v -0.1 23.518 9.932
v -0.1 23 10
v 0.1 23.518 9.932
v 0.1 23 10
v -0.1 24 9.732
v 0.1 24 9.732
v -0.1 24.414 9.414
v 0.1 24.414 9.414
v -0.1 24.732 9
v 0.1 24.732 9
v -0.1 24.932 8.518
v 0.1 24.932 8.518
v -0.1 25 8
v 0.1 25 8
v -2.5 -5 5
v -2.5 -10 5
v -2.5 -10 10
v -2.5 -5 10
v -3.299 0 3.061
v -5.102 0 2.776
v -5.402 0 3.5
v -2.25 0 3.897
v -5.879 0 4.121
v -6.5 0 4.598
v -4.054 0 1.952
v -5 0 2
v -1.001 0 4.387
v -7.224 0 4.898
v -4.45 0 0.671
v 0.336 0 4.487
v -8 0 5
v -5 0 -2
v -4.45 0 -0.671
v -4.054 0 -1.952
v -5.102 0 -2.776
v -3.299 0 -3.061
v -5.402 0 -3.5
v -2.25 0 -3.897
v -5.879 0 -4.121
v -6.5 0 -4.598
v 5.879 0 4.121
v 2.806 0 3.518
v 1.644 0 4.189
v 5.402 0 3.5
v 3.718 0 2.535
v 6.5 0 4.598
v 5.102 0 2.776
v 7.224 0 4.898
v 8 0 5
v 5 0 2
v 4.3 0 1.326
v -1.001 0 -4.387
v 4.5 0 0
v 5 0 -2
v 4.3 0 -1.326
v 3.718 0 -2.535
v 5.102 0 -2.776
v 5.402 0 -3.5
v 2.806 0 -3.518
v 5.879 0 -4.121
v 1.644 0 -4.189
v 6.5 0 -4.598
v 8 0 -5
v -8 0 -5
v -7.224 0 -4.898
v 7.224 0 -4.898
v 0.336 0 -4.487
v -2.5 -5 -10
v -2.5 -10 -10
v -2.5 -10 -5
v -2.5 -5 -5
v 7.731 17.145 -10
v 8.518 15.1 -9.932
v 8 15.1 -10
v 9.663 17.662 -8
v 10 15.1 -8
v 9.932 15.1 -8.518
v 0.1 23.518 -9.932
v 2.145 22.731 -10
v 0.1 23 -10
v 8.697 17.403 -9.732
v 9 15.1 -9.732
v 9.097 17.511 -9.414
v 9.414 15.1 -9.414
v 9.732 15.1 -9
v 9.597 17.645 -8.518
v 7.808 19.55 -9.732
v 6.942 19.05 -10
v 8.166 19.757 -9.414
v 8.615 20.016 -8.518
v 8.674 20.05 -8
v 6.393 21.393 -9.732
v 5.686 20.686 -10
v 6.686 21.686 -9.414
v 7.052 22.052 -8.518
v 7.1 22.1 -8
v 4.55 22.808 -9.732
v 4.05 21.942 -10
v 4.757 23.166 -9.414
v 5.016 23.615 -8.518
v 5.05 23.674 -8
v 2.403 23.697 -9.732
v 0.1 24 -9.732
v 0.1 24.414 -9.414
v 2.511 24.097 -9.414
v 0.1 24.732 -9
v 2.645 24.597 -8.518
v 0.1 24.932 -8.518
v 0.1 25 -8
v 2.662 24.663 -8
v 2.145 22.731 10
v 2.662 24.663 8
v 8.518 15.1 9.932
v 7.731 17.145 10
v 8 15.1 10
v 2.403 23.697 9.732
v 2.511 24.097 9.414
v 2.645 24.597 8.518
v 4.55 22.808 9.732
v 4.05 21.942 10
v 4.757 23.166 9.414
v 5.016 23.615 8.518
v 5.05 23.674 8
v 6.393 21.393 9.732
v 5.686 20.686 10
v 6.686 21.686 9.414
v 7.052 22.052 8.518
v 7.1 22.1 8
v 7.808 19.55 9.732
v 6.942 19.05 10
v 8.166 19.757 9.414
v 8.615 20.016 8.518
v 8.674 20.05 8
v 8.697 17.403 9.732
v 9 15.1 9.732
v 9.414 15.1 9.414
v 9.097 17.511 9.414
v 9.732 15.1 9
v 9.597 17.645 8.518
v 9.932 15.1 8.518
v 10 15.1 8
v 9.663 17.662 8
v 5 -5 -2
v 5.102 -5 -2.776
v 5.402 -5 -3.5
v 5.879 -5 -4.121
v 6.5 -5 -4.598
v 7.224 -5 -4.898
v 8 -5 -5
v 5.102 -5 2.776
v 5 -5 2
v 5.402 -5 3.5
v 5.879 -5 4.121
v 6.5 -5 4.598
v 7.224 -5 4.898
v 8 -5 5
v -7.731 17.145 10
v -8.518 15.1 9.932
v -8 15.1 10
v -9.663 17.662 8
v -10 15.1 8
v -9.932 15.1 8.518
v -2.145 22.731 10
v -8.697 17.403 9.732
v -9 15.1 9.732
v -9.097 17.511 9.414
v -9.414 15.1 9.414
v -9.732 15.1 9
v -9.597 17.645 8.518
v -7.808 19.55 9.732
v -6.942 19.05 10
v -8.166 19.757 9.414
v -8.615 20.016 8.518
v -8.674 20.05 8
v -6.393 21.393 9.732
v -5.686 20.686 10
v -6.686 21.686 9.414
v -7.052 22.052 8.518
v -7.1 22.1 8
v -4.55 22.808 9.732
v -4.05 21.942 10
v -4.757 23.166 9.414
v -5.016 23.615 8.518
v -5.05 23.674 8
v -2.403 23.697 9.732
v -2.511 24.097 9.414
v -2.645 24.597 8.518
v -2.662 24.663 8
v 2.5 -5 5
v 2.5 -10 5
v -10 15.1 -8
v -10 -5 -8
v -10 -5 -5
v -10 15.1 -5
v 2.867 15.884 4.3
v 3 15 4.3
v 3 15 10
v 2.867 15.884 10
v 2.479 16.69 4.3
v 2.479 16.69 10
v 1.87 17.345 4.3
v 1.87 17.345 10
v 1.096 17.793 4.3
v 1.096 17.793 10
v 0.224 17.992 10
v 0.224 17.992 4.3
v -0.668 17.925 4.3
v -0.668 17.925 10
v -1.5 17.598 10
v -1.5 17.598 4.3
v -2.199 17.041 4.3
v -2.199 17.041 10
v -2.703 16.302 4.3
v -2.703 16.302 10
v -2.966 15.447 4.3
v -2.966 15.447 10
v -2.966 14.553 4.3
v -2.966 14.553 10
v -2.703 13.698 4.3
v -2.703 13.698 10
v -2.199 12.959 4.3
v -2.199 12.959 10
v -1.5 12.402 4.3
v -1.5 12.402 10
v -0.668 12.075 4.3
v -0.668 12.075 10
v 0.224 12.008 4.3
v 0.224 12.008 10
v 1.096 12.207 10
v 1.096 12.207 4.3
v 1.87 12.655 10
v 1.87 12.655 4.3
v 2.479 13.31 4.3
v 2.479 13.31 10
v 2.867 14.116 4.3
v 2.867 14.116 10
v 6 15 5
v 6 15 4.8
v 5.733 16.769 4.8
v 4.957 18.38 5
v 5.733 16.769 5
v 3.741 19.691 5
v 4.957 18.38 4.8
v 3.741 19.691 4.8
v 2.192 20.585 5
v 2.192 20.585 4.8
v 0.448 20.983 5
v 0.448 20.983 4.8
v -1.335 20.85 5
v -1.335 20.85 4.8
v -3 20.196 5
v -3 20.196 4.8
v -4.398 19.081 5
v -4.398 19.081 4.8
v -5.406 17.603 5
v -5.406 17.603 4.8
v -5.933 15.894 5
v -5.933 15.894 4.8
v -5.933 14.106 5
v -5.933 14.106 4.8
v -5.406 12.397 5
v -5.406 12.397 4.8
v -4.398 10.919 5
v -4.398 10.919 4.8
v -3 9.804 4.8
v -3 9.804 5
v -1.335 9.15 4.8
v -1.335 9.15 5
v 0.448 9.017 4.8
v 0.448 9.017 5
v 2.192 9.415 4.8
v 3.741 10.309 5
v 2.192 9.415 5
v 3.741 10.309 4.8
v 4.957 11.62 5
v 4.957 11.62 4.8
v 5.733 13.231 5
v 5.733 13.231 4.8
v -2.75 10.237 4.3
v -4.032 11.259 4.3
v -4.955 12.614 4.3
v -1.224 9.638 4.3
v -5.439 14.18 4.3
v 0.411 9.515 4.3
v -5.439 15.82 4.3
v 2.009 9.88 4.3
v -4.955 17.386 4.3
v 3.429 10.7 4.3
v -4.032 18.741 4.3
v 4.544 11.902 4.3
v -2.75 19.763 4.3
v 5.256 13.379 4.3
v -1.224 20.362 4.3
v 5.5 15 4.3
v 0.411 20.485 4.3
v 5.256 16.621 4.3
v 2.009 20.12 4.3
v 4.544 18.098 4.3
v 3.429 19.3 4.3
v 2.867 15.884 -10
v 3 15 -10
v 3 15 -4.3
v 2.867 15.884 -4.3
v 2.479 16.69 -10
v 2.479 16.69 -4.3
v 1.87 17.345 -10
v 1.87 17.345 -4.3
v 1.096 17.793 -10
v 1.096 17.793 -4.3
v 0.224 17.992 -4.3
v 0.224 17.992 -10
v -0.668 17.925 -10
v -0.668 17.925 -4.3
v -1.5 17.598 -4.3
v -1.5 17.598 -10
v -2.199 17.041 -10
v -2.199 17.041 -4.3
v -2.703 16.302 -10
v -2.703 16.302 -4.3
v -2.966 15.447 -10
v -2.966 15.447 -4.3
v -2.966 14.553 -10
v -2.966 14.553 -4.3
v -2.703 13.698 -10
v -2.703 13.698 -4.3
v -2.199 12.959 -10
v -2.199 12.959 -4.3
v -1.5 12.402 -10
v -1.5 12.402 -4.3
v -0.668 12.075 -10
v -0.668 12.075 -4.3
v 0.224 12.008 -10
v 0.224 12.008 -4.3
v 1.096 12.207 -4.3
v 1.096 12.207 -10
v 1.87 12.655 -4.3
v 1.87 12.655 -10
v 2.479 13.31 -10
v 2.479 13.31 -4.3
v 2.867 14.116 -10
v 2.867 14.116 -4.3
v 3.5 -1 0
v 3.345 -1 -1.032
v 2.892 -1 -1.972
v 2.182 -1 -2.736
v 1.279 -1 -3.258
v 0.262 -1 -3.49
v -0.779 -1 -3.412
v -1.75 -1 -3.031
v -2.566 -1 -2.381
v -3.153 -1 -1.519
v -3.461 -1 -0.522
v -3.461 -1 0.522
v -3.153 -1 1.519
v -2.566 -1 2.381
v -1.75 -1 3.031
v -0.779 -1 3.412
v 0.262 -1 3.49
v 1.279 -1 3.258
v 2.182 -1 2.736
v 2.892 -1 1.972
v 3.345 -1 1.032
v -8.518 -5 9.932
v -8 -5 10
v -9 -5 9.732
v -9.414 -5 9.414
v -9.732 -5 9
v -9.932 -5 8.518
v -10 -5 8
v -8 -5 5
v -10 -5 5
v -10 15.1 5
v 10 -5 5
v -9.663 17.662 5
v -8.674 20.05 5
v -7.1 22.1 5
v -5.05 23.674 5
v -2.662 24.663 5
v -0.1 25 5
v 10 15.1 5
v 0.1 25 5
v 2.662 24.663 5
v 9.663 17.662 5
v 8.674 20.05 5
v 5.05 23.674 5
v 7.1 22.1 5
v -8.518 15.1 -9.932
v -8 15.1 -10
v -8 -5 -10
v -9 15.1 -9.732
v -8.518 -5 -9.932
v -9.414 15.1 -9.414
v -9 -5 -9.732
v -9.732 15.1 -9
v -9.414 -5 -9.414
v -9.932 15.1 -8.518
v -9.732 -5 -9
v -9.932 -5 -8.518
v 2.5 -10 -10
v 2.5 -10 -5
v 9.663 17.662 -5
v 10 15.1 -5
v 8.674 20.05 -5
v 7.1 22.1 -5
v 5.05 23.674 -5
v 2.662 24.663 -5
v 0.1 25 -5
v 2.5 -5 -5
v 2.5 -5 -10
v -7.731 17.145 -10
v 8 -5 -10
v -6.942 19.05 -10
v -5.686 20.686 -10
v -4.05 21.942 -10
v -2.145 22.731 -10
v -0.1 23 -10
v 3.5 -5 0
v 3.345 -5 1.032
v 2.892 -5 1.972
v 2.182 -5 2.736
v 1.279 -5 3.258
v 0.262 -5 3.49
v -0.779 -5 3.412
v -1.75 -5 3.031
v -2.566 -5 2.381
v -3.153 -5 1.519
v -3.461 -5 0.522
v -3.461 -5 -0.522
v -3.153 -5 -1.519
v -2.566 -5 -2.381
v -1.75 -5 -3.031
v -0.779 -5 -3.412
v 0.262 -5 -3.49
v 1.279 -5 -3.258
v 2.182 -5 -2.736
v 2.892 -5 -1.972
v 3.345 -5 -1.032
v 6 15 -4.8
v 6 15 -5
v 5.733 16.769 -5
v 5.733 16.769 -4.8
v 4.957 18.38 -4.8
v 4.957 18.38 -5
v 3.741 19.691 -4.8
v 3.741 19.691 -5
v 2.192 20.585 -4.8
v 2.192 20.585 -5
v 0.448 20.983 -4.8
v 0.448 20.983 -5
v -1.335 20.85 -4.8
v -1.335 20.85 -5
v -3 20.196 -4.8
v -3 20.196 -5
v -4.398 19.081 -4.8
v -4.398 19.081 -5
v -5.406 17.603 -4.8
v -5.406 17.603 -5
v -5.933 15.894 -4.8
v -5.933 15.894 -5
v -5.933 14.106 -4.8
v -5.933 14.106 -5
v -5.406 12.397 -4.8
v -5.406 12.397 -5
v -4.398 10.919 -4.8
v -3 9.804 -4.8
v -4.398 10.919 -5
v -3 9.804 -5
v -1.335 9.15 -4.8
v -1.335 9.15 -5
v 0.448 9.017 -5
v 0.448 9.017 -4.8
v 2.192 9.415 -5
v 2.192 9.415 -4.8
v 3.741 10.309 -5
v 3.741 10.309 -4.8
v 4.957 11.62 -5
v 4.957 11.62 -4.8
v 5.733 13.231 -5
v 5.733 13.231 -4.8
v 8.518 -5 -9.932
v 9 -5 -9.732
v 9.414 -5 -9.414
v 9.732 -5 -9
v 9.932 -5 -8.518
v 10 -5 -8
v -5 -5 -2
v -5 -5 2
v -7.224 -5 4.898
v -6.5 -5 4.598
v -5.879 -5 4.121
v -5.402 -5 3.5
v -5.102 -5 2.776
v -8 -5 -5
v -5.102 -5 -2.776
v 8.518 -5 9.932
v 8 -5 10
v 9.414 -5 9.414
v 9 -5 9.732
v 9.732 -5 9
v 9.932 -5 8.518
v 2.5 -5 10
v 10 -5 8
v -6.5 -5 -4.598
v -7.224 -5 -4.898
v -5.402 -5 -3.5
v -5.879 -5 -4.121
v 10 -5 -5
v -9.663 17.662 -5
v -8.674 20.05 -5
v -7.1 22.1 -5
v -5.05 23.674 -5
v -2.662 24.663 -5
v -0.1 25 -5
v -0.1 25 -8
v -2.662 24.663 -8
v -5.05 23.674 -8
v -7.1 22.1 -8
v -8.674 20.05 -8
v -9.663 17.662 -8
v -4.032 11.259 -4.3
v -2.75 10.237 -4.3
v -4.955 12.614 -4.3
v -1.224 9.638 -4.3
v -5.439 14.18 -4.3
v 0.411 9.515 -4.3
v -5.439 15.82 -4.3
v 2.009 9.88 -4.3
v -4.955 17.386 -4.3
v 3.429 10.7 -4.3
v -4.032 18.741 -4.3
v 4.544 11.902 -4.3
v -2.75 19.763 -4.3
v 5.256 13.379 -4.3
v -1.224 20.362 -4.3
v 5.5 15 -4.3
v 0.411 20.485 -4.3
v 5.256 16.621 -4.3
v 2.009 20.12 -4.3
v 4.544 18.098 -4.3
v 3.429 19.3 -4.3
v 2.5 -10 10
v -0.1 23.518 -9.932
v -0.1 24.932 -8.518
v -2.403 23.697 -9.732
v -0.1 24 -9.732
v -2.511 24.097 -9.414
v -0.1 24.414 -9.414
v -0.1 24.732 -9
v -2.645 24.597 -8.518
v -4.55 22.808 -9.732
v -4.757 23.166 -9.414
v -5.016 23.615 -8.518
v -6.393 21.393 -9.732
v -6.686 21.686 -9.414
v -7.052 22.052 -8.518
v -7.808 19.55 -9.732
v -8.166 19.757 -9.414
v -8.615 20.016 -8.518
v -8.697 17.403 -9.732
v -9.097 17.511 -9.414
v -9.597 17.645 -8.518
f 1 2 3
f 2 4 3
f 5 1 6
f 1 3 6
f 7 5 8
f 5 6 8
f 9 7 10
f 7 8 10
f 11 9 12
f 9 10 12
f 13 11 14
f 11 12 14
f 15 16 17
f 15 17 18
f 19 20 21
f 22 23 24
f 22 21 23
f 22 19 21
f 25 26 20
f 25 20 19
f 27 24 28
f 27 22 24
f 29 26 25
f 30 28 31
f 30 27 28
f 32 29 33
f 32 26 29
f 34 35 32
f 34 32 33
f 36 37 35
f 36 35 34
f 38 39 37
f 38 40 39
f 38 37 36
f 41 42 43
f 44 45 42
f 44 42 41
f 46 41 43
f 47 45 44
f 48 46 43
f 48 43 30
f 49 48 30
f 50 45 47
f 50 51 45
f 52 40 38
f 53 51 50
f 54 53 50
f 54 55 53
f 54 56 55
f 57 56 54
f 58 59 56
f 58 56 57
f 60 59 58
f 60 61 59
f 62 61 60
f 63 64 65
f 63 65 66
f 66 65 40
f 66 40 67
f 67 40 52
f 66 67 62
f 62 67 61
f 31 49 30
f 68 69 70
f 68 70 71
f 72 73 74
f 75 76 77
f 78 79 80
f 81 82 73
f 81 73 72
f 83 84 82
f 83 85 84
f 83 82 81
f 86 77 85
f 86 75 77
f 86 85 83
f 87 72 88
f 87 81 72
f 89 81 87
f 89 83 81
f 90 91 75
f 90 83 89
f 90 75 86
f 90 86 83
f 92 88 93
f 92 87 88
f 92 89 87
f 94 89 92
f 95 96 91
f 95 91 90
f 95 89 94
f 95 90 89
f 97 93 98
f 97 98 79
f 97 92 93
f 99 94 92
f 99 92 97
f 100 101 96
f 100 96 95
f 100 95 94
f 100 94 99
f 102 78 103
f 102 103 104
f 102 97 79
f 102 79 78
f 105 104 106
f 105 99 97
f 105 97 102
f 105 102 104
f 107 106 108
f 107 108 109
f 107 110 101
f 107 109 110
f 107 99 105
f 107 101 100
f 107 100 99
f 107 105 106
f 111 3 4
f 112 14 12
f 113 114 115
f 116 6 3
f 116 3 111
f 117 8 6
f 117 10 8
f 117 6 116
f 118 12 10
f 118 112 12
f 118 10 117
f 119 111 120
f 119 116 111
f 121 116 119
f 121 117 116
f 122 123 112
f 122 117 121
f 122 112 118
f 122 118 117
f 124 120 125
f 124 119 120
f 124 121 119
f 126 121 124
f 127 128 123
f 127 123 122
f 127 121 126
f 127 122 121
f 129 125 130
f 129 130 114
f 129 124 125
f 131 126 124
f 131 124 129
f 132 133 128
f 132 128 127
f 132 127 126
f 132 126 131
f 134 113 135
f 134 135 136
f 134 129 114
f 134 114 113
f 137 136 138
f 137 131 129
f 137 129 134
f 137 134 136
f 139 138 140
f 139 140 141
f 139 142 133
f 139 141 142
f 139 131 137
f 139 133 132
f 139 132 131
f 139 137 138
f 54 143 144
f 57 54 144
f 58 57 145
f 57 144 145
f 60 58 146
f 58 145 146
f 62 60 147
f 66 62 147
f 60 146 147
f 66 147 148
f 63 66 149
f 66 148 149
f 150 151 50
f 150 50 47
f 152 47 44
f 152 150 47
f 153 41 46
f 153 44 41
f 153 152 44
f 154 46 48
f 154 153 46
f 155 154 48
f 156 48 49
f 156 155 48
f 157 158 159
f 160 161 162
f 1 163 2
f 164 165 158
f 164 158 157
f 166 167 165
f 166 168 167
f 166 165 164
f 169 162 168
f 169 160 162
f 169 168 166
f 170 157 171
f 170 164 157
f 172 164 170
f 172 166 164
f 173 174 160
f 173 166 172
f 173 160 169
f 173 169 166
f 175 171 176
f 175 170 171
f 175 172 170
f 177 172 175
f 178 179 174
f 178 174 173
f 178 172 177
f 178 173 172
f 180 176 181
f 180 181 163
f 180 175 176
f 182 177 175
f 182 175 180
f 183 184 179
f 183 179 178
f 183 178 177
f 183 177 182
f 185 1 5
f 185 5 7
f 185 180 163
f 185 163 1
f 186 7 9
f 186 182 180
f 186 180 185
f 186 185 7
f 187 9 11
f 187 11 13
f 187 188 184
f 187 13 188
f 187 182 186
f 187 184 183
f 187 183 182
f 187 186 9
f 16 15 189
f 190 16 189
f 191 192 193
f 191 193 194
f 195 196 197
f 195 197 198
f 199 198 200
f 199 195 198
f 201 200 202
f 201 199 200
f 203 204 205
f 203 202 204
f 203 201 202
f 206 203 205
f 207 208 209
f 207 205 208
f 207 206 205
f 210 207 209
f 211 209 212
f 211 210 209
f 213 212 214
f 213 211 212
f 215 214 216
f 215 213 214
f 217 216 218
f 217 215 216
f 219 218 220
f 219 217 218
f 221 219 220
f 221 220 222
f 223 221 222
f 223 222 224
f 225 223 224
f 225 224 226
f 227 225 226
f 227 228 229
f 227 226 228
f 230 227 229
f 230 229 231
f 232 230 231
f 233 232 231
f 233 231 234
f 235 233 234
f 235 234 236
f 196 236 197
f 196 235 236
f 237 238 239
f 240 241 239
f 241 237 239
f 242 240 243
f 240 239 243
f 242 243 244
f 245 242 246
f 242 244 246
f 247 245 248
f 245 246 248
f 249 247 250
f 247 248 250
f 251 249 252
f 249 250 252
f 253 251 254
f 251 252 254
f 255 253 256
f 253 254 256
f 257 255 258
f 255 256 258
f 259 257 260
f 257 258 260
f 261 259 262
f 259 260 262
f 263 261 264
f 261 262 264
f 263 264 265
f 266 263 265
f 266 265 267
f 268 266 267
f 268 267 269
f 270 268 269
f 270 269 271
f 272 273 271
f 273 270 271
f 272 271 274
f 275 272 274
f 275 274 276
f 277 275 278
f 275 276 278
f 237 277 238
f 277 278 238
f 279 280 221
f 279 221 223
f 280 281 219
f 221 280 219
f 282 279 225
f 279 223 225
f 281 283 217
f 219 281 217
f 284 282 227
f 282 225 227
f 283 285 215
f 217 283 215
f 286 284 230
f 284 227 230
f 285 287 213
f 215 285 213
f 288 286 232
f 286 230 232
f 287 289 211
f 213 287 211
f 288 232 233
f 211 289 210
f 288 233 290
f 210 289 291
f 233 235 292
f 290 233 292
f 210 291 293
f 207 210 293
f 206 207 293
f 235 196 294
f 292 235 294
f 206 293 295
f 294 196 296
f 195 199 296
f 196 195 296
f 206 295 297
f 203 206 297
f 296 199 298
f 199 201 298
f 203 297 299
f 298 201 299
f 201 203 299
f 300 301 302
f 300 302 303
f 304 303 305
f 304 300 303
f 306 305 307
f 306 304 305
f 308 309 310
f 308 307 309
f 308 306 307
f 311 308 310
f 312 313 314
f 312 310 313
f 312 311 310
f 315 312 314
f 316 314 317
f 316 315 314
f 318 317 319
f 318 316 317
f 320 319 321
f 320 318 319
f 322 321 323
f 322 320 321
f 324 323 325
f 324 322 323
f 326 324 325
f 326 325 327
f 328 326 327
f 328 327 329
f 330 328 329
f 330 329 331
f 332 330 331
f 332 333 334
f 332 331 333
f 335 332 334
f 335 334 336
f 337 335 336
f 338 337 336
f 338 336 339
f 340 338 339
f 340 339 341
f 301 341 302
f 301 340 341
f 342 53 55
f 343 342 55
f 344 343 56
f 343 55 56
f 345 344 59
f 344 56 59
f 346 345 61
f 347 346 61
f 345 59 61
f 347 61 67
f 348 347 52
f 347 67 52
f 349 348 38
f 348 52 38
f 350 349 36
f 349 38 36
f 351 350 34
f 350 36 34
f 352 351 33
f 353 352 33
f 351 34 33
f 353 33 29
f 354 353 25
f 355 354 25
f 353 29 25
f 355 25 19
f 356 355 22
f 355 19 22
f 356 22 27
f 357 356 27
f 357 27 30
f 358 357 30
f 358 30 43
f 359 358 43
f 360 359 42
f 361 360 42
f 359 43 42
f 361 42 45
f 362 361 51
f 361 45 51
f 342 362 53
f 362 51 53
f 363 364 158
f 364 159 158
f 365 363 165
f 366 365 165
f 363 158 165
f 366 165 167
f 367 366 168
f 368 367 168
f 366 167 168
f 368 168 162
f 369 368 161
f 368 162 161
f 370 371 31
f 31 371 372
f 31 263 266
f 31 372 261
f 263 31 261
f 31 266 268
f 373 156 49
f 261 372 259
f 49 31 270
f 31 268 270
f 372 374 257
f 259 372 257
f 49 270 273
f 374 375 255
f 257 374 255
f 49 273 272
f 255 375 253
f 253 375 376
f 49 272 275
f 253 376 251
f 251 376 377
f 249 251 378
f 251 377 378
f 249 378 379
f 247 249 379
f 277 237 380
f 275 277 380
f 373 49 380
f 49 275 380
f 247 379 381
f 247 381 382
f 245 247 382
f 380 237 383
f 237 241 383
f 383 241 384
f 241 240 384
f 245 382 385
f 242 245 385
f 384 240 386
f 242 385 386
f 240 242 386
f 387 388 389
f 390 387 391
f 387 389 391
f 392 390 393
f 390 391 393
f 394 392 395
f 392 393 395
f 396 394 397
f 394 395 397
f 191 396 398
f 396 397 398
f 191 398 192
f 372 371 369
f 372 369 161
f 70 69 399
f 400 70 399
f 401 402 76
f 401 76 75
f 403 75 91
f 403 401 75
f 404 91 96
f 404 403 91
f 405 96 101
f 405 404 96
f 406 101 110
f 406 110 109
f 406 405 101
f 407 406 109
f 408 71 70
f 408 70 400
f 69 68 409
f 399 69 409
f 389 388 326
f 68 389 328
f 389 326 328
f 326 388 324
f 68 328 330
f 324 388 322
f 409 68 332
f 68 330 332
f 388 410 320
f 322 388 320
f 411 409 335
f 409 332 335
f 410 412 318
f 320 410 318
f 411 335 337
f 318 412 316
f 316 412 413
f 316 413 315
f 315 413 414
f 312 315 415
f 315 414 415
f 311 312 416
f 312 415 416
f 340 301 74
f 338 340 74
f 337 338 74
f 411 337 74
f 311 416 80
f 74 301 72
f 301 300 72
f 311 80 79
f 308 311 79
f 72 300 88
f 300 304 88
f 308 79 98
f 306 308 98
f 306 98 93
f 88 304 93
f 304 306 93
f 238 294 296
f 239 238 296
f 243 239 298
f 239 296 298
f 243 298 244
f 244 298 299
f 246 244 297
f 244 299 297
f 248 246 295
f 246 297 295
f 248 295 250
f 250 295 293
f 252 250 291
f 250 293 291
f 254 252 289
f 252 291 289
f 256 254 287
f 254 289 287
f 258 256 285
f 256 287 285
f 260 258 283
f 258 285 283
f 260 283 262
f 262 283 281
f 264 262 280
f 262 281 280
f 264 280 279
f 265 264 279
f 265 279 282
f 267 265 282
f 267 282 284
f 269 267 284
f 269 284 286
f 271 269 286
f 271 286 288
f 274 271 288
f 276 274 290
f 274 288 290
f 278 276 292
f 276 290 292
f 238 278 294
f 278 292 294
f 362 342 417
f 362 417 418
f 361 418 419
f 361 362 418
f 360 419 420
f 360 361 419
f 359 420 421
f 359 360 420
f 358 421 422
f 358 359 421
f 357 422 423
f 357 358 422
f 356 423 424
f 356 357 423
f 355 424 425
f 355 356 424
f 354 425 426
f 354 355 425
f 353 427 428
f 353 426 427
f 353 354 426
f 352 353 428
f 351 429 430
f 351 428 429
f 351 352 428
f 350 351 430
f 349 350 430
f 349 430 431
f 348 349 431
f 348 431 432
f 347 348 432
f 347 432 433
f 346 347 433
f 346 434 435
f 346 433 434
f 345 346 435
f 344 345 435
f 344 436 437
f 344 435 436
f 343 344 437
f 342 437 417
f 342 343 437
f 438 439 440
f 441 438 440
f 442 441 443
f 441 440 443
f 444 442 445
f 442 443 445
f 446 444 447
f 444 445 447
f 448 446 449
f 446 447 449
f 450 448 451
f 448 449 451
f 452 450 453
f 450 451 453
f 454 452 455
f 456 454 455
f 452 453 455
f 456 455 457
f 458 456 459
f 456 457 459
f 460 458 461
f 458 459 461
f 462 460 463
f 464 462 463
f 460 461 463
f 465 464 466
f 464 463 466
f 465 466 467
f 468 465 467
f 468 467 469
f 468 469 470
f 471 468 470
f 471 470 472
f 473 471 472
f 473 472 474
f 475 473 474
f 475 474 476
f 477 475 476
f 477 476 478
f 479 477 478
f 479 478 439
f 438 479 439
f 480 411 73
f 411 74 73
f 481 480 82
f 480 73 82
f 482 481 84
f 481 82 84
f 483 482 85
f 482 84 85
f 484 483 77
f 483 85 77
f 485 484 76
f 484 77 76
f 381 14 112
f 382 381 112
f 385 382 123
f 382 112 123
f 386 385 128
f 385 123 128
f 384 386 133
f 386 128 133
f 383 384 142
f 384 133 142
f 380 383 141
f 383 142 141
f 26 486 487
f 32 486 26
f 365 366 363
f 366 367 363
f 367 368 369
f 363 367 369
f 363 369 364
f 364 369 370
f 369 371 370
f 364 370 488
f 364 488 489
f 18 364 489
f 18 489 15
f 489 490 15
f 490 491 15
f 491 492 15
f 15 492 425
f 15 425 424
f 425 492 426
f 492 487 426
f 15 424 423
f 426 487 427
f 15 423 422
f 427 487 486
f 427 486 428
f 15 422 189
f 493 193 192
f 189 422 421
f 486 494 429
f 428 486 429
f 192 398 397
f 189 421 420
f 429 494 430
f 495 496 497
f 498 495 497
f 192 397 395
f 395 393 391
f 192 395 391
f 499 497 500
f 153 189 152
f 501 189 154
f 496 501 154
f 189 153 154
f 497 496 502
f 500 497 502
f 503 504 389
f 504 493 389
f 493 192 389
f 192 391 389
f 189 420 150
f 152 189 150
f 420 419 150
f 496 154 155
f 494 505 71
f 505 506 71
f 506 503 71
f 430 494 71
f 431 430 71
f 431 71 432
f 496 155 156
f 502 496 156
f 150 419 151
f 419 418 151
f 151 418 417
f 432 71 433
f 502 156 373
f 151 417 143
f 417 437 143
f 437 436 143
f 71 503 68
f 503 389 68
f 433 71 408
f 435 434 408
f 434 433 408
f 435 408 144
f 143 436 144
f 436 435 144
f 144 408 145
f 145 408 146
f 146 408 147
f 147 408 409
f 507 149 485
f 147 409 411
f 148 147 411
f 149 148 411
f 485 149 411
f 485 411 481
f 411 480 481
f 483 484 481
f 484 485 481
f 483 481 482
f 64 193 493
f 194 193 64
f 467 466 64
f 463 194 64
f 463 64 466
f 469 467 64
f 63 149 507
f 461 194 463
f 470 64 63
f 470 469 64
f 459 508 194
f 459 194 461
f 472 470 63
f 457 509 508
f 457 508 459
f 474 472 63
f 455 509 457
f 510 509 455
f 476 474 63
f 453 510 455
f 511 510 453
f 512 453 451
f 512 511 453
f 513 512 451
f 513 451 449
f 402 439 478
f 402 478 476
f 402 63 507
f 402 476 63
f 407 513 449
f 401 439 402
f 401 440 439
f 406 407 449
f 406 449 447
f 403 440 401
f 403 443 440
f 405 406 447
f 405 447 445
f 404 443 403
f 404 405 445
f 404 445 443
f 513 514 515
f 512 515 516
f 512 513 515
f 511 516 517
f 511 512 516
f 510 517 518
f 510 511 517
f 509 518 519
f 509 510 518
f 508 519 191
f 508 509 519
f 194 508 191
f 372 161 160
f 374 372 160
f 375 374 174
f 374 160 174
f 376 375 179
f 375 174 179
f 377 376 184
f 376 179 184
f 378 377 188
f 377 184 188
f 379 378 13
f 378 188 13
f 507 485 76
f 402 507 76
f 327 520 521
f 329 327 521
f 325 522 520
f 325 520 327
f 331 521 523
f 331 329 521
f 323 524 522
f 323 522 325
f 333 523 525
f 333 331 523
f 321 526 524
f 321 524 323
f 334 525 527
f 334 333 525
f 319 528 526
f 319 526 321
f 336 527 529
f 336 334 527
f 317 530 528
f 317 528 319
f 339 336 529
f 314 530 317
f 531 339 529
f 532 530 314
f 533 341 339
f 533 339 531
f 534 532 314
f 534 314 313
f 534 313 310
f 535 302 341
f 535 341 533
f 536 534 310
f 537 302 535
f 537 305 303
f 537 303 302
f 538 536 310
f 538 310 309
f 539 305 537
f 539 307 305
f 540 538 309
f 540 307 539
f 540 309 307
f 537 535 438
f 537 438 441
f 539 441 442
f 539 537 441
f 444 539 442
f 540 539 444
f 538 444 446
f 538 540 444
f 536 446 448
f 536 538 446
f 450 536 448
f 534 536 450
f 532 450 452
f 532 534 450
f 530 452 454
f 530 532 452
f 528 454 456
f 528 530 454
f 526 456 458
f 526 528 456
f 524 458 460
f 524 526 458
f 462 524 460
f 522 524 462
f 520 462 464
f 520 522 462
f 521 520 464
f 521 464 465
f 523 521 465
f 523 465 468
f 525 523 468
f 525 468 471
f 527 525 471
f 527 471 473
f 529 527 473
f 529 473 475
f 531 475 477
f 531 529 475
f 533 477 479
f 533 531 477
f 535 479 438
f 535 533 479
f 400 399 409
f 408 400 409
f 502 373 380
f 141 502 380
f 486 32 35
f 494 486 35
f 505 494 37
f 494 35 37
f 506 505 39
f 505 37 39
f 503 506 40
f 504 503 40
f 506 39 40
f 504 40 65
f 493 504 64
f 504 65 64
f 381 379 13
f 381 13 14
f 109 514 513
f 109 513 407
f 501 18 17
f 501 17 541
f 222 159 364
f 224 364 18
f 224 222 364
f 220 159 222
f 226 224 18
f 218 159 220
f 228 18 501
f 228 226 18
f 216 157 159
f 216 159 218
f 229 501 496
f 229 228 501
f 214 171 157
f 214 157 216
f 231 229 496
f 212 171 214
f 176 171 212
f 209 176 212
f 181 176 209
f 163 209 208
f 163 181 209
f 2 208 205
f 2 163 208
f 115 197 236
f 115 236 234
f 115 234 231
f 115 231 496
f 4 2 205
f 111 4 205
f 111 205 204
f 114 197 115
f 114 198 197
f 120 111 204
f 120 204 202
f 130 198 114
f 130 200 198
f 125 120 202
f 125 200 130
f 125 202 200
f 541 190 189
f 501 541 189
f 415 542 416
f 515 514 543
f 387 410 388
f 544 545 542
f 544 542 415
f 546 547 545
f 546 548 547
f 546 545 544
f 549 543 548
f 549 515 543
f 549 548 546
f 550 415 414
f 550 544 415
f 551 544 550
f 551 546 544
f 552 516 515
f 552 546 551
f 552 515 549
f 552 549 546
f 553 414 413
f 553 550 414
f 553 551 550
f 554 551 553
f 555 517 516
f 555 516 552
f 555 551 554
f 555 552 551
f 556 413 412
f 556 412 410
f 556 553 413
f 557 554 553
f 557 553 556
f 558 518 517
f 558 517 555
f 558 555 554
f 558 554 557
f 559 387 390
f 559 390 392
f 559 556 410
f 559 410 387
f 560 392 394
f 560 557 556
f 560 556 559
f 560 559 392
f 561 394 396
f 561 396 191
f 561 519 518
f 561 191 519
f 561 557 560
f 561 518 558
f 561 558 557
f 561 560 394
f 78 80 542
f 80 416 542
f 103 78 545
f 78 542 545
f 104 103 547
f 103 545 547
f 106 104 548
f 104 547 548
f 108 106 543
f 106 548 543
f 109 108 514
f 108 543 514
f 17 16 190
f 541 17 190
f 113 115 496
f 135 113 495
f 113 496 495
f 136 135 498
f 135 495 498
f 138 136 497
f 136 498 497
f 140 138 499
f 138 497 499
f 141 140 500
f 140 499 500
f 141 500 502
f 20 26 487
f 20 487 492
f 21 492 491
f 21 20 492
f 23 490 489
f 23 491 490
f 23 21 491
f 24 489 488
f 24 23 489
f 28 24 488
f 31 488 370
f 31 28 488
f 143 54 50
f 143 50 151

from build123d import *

# Parameters (mm, degrees)
BOX007_W              = 11
BOX007_H              = 7
BOX007_DEPTH          = 10
FILLET_R              = 3
ARRAY_COUNT           = 2
ARRAY_ANGLE           = 180
ARRAY_PLACEMENT_ANGLE = 90
CYLINDER004_R         = 3
CYLINDER004_DEPTH     = 30
CYLINDER_R            = 3.5
CYLINDER_DEPTH        = 15
CYLINDER006_R         = 6
CYLINDER006_DEPTH     = 4
CYLINDER005_R         = 6
CYLINDER005_DEPTH     = 4
BOX001_W              = 5
BOX001_H              = 10
BOX001_DEPTH          = 5
BOX002_W              = 20
BOX002_H              = 25
BOX002_DEPTH          = 5
BOX_W                 = 20
BOX_H                 = 5
BOX_DEPTH             = 20
FILLET001_R           = 9.9
FILLET002_R           = 2
CHAMFER_SIZE          = 1
CHAMFER001_SIZE       = 0.5


with BuildPart() as array:
    # Box007 → Box007 (new body)
    with BuildSketch(Plane(origin=(10, 5, -5), x_dir=(1, 0, 0), z_dir=(0, 0, 1))):
        with Locations((5.5, 3.5)):
            Rectangle(BOX007_W, BOX007_H)
    extrude(amount=BOX007_DEPTH)


with BuildPart() as array_1:
    # BaseFeature placement: moved
    add(array.part.moved(Location((-10, -5, 5))))

    # Fillet
    fillet_edges = [array_1.edges().sort_by_distance(p)[0] for p in [
        (5.5, 0, 10),
        (5.5, 0, 0),
    ]]
    fillet(fillet_edges, radius=FILLET_R)


with BuildPart() as array_2:
    # Body placement: moved
    add(array_1.part.moved(Location((-5, 5, 0))))

    # Array: Array ×2 about axis
    array_axis = Axis((0, 0, 0), (0, 0, 1))


with BuildPart() as array_3:
    add(array_2.part)
    for i in range(1, ARRAY_COUNT):
        add(array_2.part.rotate(array_axis, i * ARRAY_ANGLE / (ARRAY_COUNT - 1)))


with BuildPart() as array_4:
    # Array placement: moved
    add(array_3.part.moved(Location((0, -3, -5))).rotate(Axis((0, -3, -5), (0, 0, 1)), ARRAY_PLACEMENT_ANGLE))


with BuildPart() as cilindro004:
    # Cylinder004 → Cylinder004 (new body)
    with BuildSketch(Plane(origin=(0, 15, -15), x_dir=(1, 0, 0), z_dir=(0, 0, 1))):
        Circle(CYLINDER004_R)
    extrude(amount=CYLINDER004_DEPTH)


with BuildPart() as cilindro:
    # Cylinder → Cylinder (new body)
    with BuildSketch(Plane.XZ.offset(-5)):
        Circle(CYLINDER_R)
    extrude(amount=CYLINDER_DEPTH)


with BuildPart() as apoyo1:
    # Cylinder006 → Cylinder006 (new body)
    with BuildSketch(Plane.XY.offset(4.3)):
        Circle(CYLINDER006_R)
    extrude(amount=CYLINDER006_DEPTH)


with BuildPart() as fusion003:
    # Cylinder005 → Cylinder005 (new body)
    with BuildSketch(Plane.XY.offset(-8.3)):
        Circle(CYLINDER005_R)
    extrude(amount=CYLINDER005_DEPTH)

    # Fusion003: union apoyo1
    add(apoyo1.part)


with BuildPart() as fusion003_1:
    # Fusion003 placement: moved
    add(fusion003.part.moved(Location((0, 15, 0))))


with BuildPart() as pin0:
    # Box001 → Box001 (new body)
    with BuildSketch(Plane(origin=(-2.5, -10, 5), x_dir=(1, 0, 0), z_dir=(0, 0, 1))):
        with Locations((2.5, 5)):
            Rectangle(BOX001_W, BOX001_H)
    extrude(amount=BOX001_DEPTH)


with BuildPart() as pin001:
    # Clone base: copy of pin0
    add(pin0.part)


with BuildPart() as pin001_1:
    # Clone placement: moved
    add(pin001.part.moved(Location((0, 0, -15))))


with BuildPart() as pared1:
    # Box002 → Box002 (new body)
    with BuildSketch(Plane(origin=(-10, 0, 5), x_dir=(1, 0, 0), z_dir=(0, 0, 1))):
        with Locations((10, 12.5)):
            Rectangle(BOX002_W, BOX002_H)
    extrude(amount=BOX002_DEPTH)


with BuildPart() as pared002:
    # Clone001 base: copy of pared1
    add(pared1.part)


with BuildPart() as pared002_1:
    # Clone001 placement: moved
    add(pared002.part.moved(Location((0, 0, -15))))


with BuildPart() as chamfer001001:
    # Box → Box (new body)
    with BuildSketch(Plane(origin=(-10, -5, -10), x_dir=(1, 0, 0), z_dir=(0, 0, 1))):
        with Locations((10, 2.5)):
            Rectangle(BOX_W, BOX_H)
    extrude(amount=BOX_DEPTH)

    # Fusion: union pin0, pin001, pared1, pared002
    add(pin0.part)
    add(pin001_1.part)
    add(pared1.part)
    add(pared002_1.part)

    # Fusion004: union Fusion003
    add(fusion003_1.part)

    # Cut001: cut Cilindro
    add(cilindro.part, mode=Mode.SUBTRACT)

    # Cut002: cut Cilindro004
    add(cilindro004.part, mode=Mode.SUBTRACT)

    # Cut003: cut Array
    add(array_4.part, mode=Mode.SUBTRACT)

    # Fillet001
    fillet001_edges = [chamfer001001.edges().sort_by_distance(p)[0] for p in [
        (10, 25, -7.5),
        (10, 25, 7.5),
        (-10, 25, 7.5),
        (-10, 25, -7.5),
    ]]
    fillet(fillet001_edges, radius=FILLET001_R)

    # Fillet002
    fillet002_edges = [chamfer001001.edges().sort_by_distance(p)[0] for p in [
        (-10, 5.05, -10),
        (-10, 5.05, 10),
    ]]
    fillet(fillet002_edges, radius=FILLET002_R)

    # Chamfer
    chamfer_edges = [chamfer001001.edges().sort_by_distance(p)[0] for p in [
        (-3.5, 0, 0),
    ]]
    chamfer(chamfer_edges, length=CHAMFER_SIZE)

    # Chamfer001
    chamfer001_edges = [chamfer001001.edges().sort_by_distance(p)[0] for p in [
        (-6, 15, -4.3),
        (-6, 15, 4.3),
    ]]
    chamfer(chamfer001_edges, length=CHAMFER001_SIZE)


solid = chamfer001001.part
